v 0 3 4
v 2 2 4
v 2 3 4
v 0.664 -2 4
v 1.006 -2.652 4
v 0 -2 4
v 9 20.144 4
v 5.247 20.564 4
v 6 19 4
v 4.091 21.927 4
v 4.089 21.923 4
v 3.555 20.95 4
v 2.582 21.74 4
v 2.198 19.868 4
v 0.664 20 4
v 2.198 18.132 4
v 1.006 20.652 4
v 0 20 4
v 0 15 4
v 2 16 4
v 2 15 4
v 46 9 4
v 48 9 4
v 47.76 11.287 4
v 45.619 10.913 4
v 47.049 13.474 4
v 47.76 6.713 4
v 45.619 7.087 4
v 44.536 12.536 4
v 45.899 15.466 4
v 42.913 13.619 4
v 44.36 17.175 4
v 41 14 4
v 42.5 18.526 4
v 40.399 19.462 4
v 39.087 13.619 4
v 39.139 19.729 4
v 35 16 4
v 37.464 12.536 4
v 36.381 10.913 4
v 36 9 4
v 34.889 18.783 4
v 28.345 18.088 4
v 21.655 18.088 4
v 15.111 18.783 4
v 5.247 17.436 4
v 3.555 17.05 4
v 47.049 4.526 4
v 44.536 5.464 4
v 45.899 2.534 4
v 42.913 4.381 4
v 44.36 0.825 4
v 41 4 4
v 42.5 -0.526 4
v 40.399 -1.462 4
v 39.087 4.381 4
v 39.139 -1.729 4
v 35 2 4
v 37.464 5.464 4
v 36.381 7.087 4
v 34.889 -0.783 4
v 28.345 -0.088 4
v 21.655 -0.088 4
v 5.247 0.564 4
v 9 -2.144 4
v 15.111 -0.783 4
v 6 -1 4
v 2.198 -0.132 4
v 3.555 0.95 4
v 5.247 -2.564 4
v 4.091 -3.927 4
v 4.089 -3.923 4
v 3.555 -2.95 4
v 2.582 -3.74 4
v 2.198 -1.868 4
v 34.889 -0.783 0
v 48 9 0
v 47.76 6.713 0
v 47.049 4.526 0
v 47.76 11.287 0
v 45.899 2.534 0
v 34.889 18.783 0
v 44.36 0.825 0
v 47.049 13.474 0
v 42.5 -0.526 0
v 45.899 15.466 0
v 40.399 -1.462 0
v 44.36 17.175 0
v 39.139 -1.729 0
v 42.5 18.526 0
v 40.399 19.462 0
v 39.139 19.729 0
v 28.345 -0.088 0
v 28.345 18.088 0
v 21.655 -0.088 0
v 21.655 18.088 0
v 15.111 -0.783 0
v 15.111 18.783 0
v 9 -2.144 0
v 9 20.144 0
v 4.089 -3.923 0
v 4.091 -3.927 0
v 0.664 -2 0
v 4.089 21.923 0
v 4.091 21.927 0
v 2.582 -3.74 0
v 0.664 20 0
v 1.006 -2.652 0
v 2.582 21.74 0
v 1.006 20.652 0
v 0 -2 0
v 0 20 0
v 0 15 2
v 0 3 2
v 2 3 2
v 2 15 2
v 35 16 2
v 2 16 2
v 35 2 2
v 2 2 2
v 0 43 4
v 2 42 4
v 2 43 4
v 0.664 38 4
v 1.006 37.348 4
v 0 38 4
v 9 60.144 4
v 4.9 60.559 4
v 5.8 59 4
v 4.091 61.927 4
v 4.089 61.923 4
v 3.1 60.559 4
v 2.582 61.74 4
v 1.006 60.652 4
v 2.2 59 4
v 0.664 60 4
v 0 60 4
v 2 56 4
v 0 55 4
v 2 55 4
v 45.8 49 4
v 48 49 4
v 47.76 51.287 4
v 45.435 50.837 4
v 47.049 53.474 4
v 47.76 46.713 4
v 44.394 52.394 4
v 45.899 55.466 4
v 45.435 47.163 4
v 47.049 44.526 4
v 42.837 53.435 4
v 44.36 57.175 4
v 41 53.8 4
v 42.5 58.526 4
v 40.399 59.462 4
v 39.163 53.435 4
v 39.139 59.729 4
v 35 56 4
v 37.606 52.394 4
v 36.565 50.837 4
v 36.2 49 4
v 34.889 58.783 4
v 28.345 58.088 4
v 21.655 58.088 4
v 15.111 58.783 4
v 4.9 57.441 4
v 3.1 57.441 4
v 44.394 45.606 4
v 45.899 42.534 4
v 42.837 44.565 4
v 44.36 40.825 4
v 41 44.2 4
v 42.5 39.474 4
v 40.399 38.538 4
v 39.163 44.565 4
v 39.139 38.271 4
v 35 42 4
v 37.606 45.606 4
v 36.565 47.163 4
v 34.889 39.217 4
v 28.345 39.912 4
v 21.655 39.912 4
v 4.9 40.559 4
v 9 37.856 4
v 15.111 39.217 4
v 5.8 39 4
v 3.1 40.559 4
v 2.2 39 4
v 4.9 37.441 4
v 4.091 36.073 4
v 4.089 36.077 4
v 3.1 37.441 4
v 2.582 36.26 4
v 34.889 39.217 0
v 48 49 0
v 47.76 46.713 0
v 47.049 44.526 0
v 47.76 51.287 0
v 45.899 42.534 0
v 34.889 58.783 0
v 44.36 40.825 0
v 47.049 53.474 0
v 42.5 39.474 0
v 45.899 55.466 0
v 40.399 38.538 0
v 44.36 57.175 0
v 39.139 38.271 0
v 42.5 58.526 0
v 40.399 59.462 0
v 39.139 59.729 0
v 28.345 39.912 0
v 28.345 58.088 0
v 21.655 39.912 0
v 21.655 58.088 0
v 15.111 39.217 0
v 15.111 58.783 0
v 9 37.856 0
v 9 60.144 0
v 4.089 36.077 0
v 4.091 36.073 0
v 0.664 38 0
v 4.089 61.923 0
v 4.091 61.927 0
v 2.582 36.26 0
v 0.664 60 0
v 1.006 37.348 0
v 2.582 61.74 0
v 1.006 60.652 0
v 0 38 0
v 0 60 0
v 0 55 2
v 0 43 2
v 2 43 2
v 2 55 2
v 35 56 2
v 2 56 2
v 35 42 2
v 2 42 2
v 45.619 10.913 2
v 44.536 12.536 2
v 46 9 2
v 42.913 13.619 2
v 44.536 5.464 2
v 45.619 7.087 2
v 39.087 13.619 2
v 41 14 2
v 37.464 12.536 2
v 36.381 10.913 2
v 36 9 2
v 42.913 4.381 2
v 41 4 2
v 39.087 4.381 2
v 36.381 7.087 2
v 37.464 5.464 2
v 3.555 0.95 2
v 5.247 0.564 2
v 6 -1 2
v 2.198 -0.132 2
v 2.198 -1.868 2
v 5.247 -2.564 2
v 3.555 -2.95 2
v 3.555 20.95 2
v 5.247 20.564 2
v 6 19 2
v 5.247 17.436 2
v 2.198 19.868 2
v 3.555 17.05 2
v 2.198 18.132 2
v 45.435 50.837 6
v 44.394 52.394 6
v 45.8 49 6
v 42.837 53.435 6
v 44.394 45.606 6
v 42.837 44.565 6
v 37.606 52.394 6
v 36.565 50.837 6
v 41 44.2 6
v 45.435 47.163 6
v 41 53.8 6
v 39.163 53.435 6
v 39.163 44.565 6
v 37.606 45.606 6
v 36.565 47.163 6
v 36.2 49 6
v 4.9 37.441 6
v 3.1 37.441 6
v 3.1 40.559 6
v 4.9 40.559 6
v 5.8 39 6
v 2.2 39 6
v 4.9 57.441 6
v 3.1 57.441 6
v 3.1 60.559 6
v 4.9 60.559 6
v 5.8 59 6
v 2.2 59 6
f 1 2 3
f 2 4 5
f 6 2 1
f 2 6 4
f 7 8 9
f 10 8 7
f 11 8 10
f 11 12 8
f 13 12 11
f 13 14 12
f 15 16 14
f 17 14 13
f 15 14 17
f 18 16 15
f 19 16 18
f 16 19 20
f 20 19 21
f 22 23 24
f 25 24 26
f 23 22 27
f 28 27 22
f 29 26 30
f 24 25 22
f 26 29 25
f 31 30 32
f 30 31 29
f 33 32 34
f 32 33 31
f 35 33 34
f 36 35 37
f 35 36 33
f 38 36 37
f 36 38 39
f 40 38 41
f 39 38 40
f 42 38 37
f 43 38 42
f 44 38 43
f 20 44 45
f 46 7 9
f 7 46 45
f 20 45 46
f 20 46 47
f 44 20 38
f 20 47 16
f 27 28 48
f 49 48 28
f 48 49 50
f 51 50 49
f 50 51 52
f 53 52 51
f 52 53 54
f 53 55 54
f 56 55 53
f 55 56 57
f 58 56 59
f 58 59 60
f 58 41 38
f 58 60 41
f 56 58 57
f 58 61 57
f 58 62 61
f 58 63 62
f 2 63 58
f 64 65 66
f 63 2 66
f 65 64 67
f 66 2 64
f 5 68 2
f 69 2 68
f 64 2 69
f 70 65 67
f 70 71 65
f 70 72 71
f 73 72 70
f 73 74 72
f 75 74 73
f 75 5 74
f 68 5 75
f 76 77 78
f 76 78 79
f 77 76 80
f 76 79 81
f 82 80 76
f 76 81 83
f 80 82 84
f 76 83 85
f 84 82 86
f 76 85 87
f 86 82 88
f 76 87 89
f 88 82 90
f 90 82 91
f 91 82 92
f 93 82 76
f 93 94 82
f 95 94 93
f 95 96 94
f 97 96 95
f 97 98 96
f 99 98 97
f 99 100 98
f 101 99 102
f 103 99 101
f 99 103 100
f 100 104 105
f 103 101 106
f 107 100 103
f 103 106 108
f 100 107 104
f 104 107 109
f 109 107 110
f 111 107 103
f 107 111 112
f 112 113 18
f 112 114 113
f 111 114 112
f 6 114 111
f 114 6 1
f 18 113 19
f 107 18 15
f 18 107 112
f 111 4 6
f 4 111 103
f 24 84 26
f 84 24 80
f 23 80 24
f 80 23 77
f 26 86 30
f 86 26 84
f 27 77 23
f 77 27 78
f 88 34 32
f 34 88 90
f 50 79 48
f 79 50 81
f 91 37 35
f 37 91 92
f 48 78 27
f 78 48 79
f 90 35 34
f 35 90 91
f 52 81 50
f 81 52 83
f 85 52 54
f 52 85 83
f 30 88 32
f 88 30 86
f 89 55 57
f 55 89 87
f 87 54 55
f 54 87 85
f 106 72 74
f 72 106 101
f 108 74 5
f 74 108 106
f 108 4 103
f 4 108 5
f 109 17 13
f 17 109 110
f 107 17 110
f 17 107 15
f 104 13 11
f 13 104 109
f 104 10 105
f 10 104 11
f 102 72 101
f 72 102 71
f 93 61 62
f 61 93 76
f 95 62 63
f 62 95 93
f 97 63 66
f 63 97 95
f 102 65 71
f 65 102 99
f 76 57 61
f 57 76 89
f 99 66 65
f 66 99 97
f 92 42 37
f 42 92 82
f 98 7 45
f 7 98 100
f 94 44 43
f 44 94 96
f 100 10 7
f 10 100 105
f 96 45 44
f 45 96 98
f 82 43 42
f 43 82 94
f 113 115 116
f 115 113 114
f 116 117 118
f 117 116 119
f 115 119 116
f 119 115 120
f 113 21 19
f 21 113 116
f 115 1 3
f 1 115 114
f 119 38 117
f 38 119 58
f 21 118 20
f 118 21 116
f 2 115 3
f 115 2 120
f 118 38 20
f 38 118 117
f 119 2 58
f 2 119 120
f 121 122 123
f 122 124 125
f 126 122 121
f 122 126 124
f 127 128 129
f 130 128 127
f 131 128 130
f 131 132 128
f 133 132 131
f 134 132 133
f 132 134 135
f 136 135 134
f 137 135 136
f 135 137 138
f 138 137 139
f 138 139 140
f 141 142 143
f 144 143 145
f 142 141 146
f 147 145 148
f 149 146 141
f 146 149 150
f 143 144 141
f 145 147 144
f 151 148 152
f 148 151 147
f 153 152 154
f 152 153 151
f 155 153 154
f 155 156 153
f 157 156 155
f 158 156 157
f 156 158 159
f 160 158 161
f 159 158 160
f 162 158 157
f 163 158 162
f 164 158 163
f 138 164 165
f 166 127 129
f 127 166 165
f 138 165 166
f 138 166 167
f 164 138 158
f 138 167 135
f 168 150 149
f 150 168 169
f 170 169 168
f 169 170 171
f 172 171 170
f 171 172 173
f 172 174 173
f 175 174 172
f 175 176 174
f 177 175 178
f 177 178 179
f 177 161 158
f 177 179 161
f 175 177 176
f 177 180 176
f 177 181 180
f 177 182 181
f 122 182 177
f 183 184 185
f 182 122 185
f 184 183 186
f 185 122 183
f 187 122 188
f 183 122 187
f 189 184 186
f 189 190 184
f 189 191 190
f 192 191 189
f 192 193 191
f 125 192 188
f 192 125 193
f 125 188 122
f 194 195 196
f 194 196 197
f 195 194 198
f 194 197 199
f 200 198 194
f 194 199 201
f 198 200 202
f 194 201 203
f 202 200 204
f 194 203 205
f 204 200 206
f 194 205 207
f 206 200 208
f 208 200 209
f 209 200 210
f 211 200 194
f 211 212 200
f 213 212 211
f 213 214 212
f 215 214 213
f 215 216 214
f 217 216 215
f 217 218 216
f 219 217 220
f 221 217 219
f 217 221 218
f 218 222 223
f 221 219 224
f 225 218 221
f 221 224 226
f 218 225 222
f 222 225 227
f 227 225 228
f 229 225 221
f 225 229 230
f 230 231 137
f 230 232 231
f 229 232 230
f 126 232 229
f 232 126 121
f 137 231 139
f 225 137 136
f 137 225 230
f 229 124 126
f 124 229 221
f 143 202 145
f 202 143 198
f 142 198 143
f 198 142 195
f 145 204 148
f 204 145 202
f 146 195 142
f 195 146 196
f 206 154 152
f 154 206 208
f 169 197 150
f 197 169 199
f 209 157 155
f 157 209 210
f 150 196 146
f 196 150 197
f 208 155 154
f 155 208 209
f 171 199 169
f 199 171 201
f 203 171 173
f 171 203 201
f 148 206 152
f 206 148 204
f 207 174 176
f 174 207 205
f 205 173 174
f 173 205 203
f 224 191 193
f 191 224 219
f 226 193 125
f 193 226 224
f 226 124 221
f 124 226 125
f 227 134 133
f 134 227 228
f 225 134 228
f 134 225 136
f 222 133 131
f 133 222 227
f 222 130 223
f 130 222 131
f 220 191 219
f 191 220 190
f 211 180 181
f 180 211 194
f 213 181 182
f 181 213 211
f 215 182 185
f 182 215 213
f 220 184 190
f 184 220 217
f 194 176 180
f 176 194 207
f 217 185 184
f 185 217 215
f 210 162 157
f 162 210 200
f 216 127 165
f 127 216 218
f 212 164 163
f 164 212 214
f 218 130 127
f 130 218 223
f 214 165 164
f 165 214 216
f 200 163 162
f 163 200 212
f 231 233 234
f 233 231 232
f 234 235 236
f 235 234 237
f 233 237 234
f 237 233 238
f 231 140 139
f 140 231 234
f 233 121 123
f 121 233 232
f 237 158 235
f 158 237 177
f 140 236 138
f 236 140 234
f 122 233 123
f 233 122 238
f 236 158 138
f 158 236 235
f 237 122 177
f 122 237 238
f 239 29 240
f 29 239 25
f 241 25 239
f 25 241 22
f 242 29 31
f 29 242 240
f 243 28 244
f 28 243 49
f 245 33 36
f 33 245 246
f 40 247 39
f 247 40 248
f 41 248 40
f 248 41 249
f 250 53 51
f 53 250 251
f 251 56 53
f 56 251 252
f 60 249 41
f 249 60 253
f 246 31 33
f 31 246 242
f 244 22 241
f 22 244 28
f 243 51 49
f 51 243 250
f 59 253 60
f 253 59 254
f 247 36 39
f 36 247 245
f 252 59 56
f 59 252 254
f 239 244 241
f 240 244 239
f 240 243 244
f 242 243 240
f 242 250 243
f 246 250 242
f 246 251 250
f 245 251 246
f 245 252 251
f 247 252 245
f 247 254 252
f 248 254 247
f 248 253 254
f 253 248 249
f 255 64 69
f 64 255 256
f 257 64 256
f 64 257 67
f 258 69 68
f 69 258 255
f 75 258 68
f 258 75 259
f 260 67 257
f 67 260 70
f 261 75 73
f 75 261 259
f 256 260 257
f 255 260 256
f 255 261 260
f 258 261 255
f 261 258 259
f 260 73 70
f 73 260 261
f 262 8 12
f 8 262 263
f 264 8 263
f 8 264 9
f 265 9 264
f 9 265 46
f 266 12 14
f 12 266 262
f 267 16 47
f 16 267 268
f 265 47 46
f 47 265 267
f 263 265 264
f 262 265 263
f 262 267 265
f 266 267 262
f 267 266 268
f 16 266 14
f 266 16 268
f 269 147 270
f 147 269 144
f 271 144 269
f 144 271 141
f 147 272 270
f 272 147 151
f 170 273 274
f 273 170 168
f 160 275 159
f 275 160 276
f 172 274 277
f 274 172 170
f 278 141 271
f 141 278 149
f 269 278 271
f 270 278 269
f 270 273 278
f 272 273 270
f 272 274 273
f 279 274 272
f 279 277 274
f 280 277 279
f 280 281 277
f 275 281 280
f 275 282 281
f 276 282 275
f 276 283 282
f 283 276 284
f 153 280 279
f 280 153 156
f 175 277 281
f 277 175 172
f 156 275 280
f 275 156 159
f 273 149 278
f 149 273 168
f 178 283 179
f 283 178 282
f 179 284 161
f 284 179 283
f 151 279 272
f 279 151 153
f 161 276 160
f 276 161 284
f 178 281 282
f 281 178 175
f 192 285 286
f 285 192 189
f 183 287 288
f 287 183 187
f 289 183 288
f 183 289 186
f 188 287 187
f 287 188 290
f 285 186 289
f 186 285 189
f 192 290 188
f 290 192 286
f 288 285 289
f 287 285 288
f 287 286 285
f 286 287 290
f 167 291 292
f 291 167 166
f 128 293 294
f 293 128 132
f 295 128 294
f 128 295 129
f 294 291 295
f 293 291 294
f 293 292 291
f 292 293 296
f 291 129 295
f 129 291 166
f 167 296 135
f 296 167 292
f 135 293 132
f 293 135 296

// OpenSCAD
// Memory Card Holder
// 4/3/2012

/////////////////////////////////////////////////////////////////////////////////////////////////////////////
module box(width,length,height)
{
	cube([width,length,height]);
}

module negativeSpace()
{
translate([-3,1,0]) box(4,12,3);
box(33,14,3);
}

module minimalTolerances()
{
difference()
{
box(37,18,4);
translate([2,2,2]) negativeSpace();
}}

module shape()
{
box(37,18,4);
translate([0,-2,0]) box(37,22,4);
translate([37,9,0]) cylinder(4,11,11);
translate([4,0,0]) cylinder(4,4,4);
translate([4,18,0]) cylinder(4,4,4);
scale ([1.5,1,1]) translate([14,18,0]) cylinder(4,12,12);
scale ([1.5,1,1]) translate([14,0,0]) cylinder(4,12,12);
}

module cutAwayShape()
{
difference()
{
shape();
translate([25,-16,-1]) scale([2,1,1]) cylinder(6,16,16);
translate([25,34,-1]) scale([2,1,1]) cylinder(6,16,16);
}}

module finishedShape()
{
difference()
{
cutAwayShape();
translate([2,2,2]) negativeSpace();
}}




/////////////////////////////////////////////////////////////////////////////////////////////////////////////


//This is the part with the pins
translate ([0,40,0]) finishedShape();
translate ([41,49,3]) cylinder (3,4.8,4.8); // big pin
translate ([4,39,3]) cylinder (3,1.8,1.8); // left small pin
translate ([4,59,3]) cylinder (3,1.8,1.8); // right small pin

//This is the part with the holes
difference()
{
finishedShape();
translate ([41,9,2]) cylinder (3,5,5); // big hole
translate ([4,-1,2]) cylinder (3,2,2); // right small hole
translate ([4,19,2]) cylinder (3,2,2); // left small hole
}
